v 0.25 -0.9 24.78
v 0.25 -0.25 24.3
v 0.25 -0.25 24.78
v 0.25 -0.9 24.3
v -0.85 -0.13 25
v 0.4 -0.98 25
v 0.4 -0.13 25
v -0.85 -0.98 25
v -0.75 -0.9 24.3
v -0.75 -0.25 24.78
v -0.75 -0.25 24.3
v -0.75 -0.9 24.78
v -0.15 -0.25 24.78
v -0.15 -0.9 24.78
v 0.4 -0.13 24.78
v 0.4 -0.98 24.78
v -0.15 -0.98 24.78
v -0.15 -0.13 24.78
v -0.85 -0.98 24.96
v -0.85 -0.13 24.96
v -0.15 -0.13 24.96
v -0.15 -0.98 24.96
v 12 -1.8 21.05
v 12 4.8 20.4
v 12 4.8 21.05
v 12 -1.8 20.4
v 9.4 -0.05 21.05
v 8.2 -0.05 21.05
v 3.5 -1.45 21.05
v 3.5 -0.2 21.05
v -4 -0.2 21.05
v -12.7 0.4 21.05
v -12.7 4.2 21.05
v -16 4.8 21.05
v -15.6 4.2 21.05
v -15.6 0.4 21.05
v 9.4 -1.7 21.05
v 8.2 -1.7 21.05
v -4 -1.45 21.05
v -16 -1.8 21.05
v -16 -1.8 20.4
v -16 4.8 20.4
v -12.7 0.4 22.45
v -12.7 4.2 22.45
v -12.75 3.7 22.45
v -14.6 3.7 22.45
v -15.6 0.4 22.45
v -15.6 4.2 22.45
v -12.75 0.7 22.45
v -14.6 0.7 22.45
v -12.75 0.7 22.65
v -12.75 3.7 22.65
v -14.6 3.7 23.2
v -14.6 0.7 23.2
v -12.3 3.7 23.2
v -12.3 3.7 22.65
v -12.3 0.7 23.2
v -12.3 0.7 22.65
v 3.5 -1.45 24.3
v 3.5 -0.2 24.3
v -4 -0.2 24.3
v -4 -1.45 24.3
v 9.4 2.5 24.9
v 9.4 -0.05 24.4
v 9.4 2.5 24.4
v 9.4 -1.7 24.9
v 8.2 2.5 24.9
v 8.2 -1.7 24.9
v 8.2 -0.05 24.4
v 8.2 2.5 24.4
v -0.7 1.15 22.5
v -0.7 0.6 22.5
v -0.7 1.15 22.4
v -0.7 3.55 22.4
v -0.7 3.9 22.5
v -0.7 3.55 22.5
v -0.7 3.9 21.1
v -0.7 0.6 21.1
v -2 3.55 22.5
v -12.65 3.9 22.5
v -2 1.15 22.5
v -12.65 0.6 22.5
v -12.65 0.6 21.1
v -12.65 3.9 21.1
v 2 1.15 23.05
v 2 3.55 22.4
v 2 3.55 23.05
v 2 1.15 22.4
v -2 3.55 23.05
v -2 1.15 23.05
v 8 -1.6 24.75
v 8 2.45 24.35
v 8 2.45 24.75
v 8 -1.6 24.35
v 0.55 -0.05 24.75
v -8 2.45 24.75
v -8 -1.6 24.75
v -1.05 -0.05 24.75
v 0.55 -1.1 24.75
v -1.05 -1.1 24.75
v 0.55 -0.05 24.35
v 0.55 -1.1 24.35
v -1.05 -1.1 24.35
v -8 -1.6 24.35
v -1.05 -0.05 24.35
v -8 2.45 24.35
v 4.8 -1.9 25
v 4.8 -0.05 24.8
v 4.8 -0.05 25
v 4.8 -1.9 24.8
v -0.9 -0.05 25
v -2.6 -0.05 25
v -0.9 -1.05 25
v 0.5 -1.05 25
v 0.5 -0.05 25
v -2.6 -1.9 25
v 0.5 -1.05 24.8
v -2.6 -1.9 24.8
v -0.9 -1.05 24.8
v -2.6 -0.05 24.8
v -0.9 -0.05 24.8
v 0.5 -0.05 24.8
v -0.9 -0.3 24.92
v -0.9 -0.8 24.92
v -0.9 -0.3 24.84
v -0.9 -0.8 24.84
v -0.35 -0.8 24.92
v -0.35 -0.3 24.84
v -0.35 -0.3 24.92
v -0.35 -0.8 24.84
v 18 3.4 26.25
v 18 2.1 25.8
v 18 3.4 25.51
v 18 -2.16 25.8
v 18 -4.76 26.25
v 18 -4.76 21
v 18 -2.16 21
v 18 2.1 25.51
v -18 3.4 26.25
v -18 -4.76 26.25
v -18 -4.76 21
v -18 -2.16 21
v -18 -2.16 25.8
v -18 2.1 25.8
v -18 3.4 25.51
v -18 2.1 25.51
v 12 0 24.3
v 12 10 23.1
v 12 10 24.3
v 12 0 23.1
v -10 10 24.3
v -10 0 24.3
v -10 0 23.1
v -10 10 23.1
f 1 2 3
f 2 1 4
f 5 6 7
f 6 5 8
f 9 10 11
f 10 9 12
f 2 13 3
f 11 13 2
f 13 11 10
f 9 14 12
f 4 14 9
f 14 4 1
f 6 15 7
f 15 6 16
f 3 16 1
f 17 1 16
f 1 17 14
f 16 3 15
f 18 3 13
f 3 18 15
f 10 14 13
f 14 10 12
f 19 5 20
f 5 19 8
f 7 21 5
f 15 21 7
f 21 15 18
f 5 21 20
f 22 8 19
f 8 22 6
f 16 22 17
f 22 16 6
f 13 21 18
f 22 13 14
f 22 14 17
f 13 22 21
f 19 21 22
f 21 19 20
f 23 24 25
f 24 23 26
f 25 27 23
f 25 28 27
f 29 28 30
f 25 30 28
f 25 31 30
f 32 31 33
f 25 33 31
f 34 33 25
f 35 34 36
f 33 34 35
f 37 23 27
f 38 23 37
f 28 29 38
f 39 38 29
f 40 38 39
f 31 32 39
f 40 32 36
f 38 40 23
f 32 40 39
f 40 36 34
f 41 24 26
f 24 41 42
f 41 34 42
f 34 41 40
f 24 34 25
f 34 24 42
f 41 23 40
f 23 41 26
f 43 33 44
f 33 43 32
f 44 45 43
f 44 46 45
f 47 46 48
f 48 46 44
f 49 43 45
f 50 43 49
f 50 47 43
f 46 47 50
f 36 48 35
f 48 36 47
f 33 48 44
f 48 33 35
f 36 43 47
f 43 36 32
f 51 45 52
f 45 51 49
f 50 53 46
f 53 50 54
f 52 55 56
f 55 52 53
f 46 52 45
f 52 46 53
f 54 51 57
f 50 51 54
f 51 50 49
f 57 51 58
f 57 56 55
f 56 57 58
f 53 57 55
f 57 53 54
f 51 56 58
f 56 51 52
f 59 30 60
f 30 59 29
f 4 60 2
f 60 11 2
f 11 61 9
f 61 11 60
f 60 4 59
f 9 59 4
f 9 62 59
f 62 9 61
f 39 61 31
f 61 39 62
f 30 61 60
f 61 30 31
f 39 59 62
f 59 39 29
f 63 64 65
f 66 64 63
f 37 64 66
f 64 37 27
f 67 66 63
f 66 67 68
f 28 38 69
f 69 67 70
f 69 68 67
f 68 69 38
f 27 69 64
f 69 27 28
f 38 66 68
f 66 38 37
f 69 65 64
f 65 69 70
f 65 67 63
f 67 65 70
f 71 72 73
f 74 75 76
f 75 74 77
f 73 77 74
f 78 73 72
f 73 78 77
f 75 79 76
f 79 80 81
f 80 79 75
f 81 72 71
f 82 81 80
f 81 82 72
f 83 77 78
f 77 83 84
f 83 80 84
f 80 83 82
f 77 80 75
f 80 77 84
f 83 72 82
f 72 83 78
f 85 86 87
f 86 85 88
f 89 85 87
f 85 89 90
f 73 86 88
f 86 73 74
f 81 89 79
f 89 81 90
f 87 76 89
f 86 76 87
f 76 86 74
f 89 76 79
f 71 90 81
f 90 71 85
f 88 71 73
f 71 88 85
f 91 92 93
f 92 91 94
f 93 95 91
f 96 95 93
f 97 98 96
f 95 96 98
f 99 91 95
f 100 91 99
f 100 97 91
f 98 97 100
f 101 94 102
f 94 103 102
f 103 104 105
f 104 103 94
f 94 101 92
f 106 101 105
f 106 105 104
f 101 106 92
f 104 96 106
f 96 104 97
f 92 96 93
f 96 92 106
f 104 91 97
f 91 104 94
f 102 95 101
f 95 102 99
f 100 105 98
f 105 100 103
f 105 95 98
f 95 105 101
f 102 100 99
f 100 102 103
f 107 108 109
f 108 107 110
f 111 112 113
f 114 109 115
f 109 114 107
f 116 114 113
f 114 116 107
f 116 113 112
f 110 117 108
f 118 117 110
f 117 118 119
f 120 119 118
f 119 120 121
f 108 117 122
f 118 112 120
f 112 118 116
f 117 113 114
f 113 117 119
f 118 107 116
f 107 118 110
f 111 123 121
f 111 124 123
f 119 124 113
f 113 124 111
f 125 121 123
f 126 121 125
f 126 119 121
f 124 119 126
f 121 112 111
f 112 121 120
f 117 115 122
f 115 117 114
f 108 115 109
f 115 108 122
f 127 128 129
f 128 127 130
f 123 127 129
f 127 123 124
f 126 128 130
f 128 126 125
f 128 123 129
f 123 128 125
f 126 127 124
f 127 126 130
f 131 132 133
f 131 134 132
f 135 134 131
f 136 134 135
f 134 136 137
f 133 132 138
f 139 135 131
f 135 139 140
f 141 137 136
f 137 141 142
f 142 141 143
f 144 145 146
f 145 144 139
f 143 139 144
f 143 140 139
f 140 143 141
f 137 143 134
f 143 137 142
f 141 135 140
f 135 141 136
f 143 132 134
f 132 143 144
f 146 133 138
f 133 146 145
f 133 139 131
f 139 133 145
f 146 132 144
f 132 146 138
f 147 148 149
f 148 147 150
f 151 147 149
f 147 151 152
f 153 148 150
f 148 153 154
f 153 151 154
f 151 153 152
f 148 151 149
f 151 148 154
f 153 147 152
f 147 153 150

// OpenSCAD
// Under-panel pad retainer, one station. Not the case.
// y = 0 at the nominal panel edge, positive inboard. z is case z.
// x = 0 at the nub.
// Service faces are parted by 0.05 mm so the bodies stay separate.
// The tooth play, 0.20 mm, is the slide clearance. It is open toward -x.
part = "seat"; // seat | coupon

module carrier() {
  // Floor under the pad. Pad bottom is 0.05 mm above z = 21.05.
  translate([-16.0, -1.80, 20.40]) cube([28.0, 6.60, 0.65]);
  // Root wall, overlapped into the floor. Stops 0.05 mm short of the beam.
  translate([-15.6, 0.40, 20.90]) cube([2.90, 3.8, 1.55]);
  // Lip 0.15 mm above the beam top (22.50). The riser stays on the wall.
  translate([-14.6, 0.70, 22.20]) cube([1.85, 3.0, 0.55]);
  translate([-14.6, 0.70, 22.65]) cube([2.30, 3.0, 0.55]);
  // Shoulder under the plate, outboard of the panel. Top z = 24.30.
  translate([-4.0, -1.45, 20.90]) cube([7.5, 1.25, 3.40]);
  // Stem through the plate hole, and the head above the plate.
  // The groove is open toward -x. Tooth ends at x = -0.35; solid stem starts at -0.15.
  difference() {
    union() {
      translate([-0.75, -0.90, 20.90]) cube([1.00, 0.65, 4.10]);
      translate([-0.85, -0.98, 24.78]) cube([1.25, 0.85, 0.22]);
    }
    translate([-1.40, -1.20, 24.78]) cube([1.25, 1.30, 0.18]);
  }
  // End stop. Leg is outboard of the panel. Bar clears the panel front.
  translate([8.20, -1.70, 20.90]) cube([1.20, 1.65, 4.00]);
  translate([8.20, -1.70, 24.40]) cube([1.20, 4.20, 0.50]);
}

module pad() {
  translate([-12.65, 0.60, 21.10]) cube([11.95, 3.30, 1.40]);
  // Nub top is 0.05 mm under the 1.2 mm panel back. Centre y = 2.25.
  translate([-2.00, 1.15, 22.40]) cube([4.00, 2.40, 0.65]);
}

module plate() {
  // Underside 0.05 mm above the shoulder and above the panel front.
  // The hole clears the stem.
  difference() {
    translate([-8.0, -1.60, 24.35]) cube([16.0, 4.05, 0.40]);
    translate([-1.05, -1.10, 24.25]) cube([1.60, 1.05, 0.60]);
  }
}

module washer() {
  union() {
    // 0.20 mm, 0.05 mm above the plate. Ear is the outboard tab.
    // The opening around the stem is wider than the stem.
    translate([-2.6, -1.90, 24.80]) cube([7.4, 0.85, 0.20]);
    translate([-2.6, -1.05, 24.80]) cube([1.70, 1.00, 0.20]);
    translate([0.50, -1.05, 24.80]) cube([4.3, 1.00, 0.20]);
    // Tooth under the head. 0.20 mm of x play before the head's closed side.
    translate([-1.15, -0.80, 24.84]) cube([0.80, 0.50, 0.08]);
  }
}

module panel() {
  translate([-10.0, 0.0, 23.10]) cube([22.0, 10.0, 1.20]);
}

module shell() {
  // Side wall. Inner face 2.16 mm outboard.
  translate([-18.0, -4.76, 21.00]) cube([36.0, 2.60, 5.25]);
  // Pocket ceiling z = 25.80, from the wall to 2.20 mm inboard.
  translate([-18.0, -2.30, 25.80]) cube([36.0, 4.50, 0.45]);
  // Original ceiling from there to the window at 3.32 mm inboard.
  translate([-18.0, 2.10, 25.51]) cube([36.0, 1.30, 0.74]);
}

module seat() {
  carrier();
  pad();
  plate();
  washer();
  panel();
  shell();
}

// Print pose, bed at z = 0.
// Pad: nub top is the preload face (top layers). Beam bottom is on the bed.
// Plate: underside is the bearing face, on the bed.
// Washer: stop face is on the bed. One 0.20 mm layer.
module coupon() {
  cube([12.7, 3.3, 1.40]);
  translate([8.7, 0.45, 1.40]) cube([4.00, 2.40, 1.00]);
  translate([18.0, 0, 0]) cube([16.0, 4.0, 0.40]);
  translate([18.0, 5.0, 0]) cube([8.0, 4.2, 0.20]);
}

if (part == "seat") seat();
if (part == "coupon") coupon();
if (part == "carrier") carrier();
if (part == "pad") pad();
if (part == "plate") plate();
if (part == "washer") washer();
if (part == "panel") panel();
if (part == "shell") shell();
